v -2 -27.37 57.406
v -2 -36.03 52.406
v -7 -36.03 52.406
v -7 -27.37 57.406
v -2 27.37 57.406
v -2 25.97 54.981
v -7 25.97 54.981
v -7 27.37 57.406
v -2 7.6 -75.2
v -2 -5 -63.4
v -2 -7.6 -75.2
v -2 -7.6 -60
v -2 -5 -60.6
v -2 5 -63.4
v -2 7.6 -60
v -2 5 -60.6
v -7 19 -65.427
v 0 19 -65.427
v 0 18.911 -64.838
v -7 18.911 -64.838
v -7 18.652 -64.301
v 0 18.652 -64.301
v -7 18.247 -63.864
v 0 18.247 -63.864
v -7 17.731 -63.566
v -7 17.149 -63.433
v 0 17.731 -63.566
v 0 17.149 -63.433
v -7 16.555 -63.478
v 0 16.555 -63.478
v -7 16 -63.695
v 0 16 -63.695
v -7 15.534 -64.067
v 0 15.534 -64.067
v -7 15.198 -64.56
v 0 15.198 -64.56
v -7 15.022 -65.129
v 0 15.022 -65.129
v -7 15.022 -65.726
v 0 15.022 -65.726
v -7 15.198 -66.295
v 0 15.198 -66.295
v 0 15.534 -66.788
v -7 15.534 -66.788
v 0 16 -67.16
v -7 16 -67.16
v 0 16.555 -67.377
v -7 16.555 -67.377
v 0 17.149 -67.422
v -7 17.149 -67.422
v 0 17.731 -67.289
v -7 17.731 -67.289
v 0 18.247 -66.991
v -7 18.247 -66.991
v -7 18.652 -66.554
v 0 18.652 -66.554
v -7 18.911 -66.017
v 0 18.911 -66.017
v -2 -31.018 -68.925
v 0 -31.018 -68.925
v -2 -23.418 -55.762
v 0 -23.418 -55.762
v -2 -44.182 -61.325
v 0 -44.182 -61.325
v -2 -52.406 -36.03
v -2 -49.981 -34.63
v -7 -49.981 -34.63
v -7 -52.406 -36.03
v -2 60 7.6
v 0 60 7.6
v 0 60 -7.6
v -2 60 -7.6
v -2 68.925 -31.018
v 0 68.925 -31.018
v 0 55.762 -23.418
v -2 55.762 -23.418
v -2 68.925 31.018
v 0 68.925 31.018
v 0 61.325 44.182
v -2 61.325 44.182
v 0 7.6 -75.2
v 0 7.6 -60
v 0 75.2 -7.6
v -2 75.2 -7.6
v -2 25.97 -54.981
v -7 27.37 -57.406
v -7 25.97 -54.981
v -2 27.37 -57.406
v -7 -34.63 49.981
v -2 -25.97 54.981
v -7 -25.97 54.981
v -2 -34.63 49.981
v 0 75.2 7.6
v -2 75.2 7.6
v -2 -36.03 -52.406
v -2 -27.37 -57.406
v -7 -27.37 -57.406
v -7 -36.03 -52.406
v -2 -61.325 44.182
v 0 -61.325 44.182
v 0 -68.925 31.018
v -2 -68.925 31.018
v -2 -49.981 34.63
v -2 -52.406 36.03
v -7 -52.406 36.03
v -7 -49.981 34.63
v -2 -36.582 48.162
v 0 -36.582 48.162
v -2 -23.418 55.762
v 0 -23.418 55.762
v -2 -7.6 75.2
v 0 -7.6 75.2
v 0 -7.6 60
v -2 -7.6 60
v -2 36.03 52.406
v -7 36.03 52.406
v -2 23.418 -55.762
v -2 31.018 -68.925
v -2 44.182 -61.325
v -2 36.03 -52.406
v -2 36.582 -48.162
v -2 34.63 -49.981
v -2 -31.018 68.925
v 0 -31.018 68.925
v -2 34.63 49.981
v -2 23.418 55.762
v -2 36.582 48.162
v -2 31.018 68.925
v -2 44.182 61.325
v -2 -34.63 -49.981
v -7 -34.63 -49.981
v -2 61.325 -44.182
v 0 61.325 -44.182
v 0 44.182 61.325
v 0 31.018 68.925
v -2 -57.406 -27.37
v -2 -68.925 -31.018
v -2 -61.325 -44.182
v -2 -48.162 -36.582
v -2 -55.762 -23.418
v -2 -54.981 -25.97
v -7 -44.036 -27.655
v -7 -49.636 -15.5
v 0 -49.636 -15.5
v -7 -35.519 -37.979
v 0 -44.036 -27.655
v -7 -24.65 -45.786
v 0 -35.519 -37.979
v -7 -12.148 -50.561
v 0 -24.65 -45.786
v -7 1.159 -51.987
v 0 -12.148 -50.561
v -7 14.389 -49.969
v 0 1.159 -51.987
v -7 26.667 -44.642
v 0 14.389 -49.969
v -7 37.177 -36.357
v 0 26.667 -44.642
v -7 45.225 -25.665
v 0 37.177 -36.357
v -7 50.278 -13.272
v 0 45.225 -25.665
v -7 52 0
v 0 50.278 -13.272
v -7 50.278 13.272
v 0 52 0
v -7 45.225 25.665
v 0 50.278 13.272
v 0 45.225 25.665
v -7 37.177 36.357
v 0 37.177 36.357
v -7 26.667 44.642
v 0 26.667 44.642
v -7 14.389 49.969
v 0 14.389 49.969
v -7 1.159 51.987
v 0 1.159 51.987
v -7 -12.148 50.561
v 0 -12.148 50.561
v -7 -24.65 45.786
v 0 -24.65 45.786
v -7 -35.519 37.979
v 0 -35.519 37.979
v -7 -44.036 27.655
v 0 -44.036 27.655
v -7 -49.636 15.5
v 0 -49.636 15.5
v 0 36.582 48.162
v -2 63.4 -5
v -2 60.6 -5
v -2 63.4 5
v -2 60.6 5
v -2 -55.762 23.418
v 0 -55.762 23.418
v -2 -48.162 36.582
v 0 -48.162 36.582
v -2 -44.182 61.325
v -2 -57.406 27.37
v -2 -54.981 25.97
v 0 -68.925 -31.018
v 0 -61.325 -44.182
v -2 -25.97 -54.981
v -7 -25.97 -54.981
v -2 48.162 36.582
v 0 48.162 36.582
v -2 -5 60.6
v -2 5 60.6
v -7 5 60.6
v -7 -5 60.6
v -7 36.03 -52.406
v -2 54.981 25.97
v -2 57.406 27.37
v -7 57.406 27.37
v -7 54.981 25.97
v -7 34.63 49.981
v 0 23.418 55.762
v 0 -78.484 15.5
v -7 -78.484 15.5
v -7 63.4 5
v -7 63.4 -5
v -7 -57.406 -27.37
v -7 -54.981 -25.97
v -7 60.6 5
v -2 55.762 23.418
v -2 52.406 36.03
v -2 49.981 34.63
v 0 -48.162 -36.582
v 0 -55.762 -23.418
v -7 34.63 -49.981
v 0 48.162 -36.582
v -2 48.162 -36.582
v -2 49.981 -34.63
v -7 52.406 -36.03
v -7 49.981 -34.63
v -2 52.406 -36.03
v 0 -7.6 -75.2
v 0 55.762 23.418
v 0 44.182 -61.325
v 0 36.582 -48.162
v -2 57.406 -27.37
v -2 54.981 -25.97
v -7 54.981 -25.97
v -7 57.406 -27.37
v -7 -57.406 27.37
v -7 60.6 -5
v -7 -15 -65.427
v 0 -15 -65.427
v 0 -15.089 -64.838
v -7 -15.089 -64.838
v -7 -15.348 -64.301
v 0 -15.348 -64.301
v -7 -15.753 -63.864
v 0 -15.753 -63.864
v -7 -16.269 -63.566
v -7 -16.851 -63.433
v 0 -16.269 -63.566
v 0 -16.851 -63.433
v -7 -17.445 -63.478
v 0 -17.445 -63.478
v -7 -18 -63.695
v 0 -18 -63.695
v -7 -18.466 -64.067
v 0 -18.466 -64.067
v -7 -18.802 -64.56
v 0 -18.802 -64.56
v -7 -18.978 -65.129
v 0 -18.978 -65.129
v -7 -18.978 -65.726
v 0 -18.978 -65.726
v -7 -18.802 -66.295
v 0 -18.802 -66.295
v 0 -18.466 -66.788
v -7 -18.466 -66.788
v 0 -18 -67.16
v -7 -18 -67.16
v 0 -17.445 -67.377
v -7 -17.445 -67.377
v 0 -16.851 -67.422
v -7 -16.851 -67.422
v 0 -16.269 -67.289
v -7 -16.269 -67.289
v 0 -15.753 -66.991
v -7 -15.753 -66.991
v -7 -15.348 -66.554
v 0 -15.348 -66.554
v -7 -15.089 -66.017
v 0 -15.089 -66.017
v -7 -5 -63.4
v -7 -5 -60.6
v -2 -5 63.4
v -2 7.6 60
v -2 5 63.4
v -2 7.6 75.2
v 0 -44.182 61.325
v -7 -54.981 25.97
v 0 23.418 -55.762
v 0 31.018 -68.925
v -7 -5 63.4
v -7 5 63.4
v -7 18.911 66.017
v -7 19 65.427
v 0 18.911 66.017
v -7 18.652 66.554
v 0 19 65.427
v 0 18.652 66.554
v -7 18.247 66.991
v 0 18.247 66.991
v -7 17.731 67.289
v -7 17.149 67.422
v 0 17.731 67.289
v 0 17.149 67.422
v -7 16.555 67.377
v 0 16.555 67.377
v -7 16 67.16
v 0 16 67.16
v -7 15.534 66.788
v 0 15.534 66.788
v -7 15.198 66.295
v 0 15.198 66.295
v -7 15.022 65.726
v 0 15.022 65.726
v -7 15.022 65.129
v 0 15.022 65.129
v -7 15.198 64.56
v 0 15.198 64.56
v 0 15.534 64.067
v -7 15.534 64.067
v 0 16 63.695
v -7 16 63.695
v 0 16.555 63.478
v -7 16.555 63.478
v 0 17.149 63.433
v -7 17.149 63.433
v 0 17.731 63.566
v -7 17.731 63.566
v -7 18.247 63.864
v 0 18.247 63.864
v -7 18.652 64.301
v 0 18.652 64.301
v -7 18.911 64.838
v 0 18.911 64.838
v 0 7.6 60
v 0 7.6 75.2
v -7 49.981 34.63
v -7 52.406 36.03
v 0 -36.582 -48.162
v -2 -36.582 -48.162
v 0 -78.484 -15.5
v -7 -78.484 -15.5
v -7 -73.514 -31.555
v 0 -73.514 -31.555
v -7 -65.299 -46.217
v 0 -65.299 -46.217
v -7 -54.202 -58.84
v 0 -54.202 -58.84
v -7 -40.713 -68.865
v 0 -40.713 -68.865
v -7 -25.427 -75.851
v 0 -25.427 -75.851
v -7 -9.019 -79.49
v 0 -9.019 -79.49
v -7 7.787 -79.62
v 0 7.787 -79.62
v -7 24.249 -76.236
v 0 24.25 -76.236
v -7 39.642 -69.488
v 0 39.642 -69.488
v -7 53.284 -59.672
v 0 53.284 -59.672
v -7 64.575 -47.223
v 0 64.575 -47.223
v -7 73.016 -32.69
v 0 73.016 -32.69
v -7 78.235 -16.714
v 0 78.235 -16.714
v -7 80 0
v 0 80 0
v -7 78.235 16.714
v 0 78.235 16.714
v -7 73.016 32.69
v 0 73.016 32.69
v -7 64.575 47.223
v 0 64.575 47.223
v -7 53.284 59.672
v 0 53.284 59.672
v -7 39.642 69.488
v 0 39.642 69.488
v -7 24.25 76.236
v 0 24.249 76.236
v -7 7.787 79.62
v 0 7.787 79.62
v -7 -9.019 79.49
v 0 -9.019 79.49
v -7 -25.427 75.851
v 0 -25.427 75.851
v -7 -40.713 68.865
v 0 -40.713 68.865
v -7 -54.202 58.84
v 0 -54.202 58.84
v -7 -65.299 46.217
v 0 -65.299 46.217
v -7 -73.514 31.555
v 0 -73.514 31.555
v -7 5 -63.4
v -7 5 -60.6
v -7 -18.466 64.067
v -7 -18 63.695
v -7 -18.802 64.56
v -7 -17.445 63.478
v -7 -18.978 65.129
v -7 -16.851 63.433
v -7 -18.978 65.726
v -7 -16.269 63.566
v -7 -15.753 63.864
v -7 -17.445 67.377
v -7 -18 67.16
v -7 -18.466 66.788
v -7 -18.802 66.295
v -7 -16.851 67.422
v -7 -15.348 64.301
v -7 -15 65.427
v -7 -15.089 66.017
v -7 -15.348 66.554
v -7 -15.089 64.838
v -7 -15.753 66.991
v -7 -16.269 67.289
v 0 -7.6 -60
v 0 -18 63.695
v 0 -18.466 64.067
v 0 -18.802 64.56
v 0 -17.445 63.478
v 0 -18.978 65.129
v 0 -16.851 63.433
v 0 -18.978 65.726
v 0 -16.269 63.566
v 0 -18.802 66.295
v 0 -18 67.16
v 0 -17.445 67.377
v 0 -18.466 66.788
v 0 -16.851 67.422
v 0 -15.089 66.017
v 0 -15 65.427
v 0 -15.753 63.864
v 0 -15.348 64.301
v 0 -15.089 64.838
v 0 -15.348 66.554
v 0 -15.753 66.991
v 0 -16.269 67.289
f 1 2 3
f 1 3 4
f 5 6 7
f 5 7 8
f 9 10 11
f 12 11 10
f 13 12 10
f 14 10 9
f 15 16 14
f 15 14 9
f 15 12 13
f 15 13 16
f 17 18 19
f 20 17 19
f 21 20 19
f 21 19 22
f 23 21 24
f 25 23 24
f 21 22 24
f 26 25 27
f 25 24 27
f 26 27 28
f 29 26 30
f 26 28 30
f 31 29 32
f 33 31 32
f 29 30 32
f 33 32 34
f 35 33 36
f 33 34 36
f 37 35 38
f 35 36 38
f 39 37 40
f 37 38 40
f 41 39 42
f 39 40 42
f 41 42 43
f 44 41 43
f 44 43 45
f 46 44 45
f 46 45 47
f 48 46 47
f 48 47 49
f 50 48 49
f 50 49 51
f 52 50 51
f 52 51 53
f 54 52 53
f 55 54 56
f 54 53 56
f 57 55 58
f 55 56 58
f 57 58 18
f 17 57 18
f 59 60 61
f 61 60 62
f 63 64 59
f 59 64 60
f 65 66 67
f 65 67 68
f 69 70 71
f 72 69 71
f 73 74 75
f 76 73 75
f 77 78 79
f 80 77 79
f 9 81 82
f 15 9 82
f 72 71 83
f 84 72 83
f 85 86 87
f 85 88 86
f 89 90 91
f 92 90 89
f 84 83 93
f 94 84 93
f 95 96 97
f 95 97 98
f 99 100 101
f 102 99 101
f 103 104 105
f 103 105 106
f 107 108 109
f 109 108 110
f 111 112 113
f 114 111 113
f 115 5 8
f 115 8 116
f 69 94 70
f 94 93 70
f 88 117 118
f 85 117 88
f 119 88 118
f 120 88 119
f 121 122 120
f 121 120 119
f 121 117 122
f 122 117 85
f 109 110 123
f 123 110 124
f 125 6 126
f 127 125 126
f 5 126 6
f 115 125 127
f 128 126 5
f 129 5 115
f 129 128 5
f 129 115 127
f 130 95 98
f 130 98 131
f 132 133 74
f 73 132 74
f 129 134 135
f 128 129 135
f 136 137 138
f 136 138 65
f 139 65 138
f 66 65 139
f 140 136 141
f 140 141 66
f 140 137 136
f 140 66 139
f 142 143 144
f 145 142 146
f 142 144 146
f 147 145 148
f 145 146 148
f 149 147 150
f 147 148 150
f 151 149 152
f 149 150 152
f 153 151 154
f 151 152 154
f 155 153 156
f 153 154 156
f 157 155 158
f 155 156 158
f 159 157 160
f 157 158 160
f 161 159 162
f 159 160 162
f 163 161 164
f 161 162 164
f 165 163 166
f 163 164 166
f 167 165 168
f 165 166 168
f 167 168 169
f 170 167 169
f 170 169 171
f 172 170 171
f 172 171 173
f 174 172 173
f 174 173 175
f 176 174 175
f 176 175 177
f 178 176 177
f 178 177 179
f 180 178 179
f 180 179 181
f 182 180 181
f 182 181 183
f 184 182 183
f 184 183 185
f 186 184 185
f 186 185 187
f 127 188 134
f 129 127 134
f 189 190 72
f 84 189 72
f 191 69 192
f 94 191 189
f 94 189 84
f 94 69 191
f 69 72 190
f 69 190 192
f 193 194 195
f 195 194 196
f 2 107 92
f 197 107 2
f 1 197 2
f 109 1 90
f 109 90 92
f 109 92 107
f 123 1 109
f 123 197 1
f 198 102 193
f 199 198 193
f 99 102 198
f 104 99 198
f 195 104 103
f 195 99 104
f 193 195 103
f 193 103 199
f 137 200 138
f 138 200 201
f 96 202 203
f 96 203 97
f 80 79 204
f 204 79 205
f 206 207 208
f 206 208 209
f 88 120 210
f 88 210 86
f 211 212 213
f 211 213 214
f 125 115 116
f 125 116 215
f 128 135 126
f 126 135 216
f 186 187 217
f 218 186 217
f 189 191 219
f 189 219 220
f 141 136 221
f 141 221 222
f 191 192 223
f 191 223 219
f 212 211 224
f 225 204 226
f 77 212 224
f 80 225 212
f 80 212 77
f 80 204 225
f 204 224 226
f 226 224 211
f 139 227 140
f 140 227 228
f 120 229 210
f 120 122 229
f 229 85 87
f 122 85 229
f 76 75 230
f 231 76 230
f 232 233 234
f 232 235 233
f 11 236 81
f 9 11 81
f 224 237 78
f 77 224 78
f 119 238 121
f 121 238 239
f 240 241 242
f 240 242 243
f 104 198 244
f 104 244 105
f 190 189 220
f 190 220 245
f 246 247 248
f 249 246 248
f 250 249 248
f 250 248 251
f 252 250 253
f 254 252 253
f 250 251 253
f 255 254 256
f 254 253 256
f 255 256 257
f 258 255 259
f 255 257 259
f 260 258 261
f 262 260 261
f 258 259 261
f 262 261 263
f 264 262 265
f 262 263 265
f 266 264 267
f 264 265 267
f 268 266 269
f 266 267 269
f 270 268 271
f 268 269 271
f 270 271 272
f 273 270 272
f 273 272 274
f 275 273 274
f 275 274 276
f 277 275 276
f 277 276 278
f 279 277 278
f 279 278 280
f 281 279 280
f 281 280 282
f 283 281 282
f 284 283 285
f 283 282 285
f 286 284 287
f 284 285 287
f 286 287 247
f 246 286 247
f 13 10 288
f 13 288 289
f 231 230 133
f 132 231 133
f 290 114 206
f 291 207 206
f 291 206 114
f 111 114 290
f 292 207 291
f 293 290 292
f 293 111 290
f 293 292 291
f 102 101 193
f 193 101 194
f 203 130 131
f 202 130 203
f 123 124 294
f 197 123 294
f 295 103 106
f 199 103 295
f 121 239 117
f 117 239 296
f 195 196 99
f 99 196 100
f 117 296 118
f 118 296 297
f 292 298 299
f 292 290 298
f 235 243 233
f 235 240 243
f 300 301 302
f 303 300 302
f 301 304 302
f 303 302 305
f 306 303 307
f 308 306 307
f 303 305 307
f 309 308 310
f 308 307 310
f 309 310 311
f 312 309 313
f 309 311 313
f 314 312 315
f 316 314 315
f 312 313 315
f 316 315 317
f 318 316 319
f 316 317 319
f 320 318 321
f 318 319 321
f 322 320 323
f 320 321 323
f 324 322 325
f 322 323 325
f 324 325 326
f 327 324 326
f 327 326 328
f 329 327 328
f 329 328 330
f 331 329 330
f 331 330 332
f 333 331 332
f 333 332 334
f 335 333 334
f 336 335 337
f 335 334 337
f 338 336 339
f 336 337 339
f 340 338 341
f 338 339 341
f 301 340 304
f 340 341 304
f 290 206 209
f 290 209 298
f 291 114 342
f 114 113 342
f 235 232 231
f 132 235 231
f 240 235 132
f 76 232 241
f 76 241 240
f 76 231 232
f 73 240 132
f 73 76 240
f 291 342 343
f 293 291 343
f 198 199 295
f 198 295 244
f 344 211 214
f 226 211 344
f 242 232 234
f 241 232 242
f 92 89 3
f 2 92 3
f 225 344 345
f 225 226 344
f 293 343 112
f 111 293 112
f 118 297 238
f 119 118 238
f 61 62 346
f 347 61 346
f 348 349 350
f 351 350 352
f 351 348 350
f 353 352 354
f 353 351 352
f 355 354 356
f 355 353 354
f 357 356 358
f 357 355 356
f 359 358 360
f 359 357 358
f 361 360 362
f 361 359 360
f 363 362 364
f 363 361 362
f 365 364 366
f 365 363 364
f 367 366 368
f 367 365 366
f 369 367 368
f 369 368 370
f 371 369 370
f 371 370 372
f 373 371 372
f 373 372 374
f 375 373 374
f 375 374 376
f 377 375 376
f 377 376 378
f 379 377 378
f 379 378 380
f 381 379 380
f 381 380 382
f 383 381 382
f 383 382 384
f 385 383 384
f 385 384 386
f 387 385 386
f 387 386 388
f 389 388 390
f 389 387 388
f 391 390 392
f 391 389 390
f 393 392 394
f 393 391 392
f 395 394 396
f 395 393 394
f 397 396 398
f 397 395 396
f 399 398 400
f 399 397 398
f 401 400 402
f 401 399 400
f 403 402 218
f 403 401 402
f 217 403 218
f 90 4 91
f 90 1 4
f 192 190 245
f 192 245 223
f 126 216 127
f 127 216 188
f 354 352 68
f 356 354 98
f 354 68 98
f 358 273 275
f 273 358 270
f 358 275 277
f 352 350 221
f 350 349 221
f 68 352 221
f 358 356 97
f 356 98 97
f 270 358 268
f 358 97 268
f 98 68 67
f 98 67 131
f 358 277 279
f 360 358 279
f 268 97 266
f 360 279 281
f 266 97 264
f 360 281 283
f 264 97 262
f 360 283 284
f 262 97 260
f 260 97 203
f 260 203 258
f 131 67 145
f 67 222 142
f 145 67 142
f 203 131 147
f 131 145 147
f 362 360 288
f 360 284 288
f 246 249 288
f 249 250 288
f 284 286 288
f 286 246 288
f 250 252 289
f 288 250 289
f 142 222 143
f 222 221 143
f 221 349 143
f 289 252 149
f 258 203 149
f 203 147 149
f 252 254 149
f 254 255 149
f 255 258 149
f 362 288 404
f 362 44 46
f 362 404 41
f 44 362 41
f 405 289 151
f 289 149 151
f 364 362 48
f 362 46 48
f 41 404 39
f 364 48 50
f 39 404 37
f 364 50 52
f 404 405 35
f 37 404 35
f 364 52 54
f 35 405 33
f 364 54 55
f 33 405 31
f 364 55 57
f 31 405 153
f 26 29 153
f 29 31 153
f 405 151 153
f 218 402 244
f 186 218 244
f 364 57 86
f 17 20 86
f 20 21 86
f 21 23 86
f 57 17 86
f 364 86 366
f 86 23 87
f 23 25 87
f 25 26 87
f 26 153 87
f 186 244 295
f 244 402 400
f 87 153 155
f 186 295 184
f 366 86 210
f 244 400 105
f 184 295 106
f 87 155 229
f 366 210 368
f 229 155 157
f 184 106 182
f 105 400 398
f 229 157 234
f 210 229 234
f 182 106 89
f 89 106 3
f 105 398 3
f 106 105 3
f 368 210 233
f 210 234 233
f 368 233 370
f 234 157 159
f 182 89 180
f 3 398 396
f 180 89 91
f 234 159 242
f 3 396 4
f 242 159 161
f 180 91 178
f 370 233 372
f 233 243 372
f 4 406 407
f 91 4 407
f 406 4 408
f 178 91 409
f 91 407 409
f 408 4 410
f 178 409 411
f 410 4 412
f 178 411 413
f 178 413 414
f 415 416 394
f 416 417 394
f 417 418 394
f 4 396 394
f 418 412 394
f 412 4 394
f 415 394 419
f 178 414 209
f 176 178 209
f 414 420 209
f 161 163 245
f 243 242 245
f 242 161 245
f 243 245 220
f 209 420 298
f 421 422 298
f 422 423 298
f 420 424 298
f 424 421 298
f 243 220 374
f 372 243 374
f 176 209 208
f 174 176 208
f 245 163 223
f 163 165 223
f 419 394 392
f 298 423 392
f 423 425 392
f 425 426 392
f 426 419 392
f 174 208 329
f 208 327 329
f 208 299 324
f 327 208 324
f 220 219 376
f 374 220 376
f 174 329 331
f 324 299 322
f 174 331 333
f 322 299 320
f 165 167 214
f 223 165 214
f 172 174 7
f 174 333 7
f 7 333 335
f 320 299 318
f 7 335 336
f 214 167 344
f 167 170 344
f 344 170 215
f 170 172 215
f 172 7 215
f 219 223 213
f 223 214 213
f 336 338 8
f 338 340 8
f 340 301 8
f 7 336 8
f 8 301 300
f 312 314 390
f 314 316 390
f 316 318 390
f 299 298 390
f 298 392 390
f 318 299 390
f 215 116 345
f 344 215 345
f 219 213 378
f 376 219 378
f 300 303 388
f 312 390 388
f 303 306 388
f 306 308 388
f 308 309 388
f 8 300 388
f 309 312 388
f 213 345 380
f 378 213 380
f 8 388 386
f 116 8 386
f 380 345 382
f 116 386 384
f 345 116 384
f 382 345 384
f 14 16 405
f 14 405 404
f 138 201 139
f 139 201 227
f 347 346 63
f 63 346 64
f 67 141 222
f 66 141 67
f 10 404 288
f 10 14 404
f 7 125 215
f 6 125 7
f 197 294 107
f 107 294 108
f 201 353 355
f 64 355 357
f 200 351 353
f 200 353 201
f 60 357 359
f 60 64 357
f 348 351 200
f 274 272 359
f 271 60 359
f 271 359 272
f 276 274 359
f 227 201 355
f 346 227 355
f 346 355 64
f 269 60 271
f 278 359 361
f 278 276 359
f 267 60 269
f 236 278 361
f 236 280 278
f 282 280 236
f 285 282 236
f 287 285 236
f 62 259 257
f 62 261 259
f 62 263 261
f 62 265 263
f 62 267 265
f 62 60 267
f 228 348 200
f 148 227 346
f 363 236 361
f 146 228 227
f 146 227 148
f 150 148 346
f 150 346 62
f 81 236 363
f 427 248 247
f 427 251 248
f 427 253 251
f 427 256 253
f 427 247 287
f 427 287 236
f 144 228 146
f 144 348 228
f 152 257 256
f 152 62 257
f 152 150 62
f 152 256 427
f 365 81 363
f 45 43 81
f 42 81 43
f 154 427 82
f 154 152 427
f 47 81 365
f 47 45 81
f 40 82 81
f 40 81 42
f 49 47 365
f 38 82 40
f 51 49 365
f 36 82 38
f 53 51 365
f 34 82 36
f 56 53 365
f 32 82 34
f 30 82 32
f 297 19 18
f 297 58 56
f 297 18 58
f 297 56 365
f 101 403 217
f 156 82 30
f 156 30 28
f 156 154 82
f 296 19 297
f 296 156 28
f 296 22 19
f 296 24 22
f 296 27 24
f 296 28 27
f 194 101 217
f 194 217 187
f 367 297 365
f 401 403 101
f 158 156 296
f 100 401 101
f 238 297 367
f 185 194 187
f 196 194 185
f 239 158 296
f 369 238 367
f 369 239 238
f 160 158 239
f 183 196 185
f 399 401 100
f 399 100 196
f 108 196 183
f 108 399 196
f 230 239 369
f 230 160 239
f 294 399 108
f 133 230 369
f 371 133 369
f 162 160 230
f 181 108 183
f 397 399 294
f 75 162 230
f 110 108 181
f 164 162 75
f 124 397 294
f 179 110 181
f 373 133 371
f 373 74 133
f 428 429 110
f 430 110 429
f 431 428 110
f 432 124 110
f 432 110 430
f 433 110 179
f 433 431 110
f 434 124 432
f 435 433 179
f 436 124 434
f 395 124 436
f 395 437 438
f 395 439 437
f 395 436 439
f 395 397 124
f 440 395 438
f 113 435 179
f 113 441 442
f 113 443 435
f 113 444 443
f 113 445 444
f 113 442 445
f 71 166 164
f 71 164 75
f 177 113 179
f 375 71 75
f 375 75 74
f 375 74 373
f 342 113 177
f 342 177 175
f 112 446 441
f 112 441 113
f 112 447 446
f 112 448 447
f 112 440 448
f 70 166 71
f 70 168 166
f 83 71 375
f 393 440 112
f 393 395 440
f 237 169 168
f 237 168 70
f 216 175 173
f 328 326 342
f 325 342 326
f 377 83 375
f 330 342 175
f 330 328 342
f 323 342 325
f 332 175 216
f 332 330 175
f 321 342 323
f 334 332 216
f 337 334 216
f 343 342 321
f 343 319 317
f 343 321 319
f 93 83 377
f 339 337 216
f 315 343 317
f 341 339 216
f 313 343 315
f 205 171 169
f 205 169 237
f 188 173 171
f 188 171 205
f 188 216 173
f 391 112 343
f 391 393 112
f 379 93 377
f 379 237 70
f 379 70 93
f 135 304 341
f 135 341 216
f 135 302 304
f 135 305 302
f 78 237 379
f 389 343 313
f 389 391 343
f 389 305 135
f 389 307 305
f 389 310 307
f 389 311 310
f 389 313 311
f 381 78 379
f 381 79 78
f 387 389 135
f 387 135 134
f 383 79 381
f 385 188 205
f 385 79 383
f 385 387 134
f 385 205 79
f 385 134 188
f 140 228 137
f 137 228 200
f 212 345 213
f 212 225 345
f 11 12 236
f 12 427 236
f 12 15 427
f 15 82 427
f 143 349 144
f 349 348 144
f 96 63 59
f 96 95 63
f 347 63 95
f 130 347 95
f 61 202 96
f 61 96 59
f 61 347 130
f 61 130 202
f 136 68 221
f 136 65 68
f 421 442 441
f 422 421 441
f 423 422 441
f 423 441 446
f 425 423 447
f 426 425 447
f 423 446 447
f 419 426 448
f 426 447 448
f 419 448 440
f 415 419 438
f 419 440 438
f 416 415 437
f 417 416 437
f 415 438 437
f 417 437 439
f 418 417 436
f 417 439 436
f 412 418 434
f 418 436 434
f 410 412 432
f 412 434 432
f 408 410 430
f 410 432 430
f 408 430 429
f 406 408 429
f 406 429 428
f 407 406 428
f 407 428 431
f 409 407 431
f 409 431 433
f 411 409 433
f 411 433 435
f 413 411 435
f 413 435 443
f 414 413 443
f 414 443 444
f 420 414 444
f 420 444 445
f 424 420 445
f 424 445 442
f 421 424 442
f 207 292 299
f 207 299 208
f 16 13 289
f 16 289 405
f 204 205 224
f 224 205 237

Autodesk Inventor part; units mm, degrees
ref_plane "YZ Plane" through (0, 0, 0) normal (1, 0, 0) x (0, 1, 0)
ref_plane "XZ Plane" through (0, 0, 0) normal (0, 1, 0) x (-1, 0, 0)
ref_plane "XY Plane" through (0, 0, 0) normal (0, 0, 1) x (1, 0, 0)
sketch "Szkic1" plane through (0, 0, 0) normal (1, 0, 0) x (0, 1, 0)
  line L0 (0, -112) -> (0, 112) construction
  line L1 (-112, 0) -> (112, 0) construction
  circle A0 centre (0, 0) radius 67.6 construction
  line L2 (75.2, 7.6) -> (60, 7.6)
  line L3 (60, 7.6) -> (60, -7.6)
  line L4 (60, -7.6) -> (75.2, -7.6)
  line L5 (75.2, -7.6) -> (75.2, 7.6)
  line L6 (75.2, 7.6) -> (60, -7.6) construction
  line L7 (60, 7.6) -> (75.2, -7.6) construction
  circle A1 centre (0, 0) radius 80
  line L8 (61.3251, 44.1818) -> (48.1615, 36.5818)
  line L9 (48.1615, 36.5818) -> (55.7615, 23.4182)
  line L10 (55.7615, 23.4182) -> (68.9251, 31.0182)
  line L11 (68.9251, 31.0182) -> (61.3251, 44.1818)
  line L12 (61.3251, 44.1818) -> (55.7615, 23.4182) construction
  line L13 (48.1615, 36.5818) -> (68.9251, 31.0182) construction
  line L14 (31.0182, 68.9251) -> (23.4182, 55.7615)
  line L15 (23.4182, 55.7615) -> (36.5818, 48.1615)
  line L16 (36.5818, 48.1615) -> (44.1818, 61.3251)
  line L17 (44.1818, 61.3251) -> (31.0182, 68.9251)
  line L18 (31.0182, 68.9251) -> (36.5818, 48.1615) construction
  line L19 (23.4182, 55.7615) -> (44.1818, 61.3251) construction
  line L20 (-7.6, 75.2) -> (-7.6, 60)
  line L21 (-7.6, 60) -> (7.6, 60)
  line L22 (7.6, 60) -> (7.6, 75.2)
  line L23 (7.6, 75.2) -> (-7.6, 75.2)
  line L24 (-7.6, 75.2) -> (7.6, 60) construction
  line L25 (-7.6, 60) -> (7.6, 75.2) construction
  line L26 (-44.1818, 61.3251) -> (-36.5818, 48.1615)
  line L27 (-36.5818, 48.1615) -> (-23.4182, 55.7615)
  line L28 (-23.4182, 55.7615) -> (-31.0182, 68.9251)
  line L29 (-31.0182, 68.9251) -> (-44.1818, 61.3251)
  line L30 (-44.1818, 61.3251) -> (-23.4182, 55.7615) construction
  line L31 (-36.5818, 48.1615) -> (-31.0182, 68.9251) construction
  line L32 (-68.9251, 31.0182) -> (-55.7615, 23.4182)
  line L33 (-55.7615, 23.4182) -> (-48.1615, 36.5818)
  line L34 (-48.1615, 36.5818) -> (-61.3251, 44.1818)
  line L35 (-61.3251, 44.1818) -> (-68.9251, 31.0182)
  line L36 (-68.9251, 31.0182) -> (-48.1615, 36.5818) construction
  line L37 (-55.7615, 23.4182) -> (-61.3251, 44.1818) construction
  line L38 (-75.2, -7.6) -> (-60, -7.6) construction
  line L39 (-60, -7.6) -> (-60, 7.6) construction
  line L40 (-60, 7.6) -> (-75.2, 7.6) construction
  line L41 (-75.2, 7.6) -> (-75.2, -7.6) construction
  line L42 (-75.2, -7.6) -> (-60, 7.6) construction
  line L43 (-60, -7.6) -> (-75.2, 7.6) construction
  line L44 (-61.3251, -44.1818) -> (-48.1615, -36.5818)
  line L45 (-48.1615, -36.5818) -> (-55.7615, -23.4182)
  line L46 (-55.7615, -23.4182) -> (-68.9251, -31.0182)
  line L47 (-68.9251, -31.0182) -> (-61.3251, -44.1818)
  line L48 (-61.3251, -44.1818) -> (-55.7615, -23.4182) construction
  line L49 (-48.1615, -36.5818) -> (-68.9251, -31.0182) construction
  line L50 (-31.0182, -68.9251) -> (-23.4182, -55.7615)
  line L51 (-23.4182, -55.7615) -> (-36.5818, -48.1615)
  line L52 (-36.5818, -48.1615) -> (-44.1818, -61.3251)
  line L53 (-44.1818, -61.3251) -> (-31.0182, -68.9251)
  line L54 (-31.0182, -68.9251) -> (-36.5818, -48.1615) construction
  line L55 (-23.4182, -55.7615) -> (-44.1818, -61.3251) construction
  line L56 (7.6, -75.2) -> (7.6, -60)
  line L57 (7.6, -60) -> (-7.6, -60)
  line L58 (-7.6, -60) -> (-7.6, -75.2)
  line L59 (-7.6, -75.2) -> (7.6, -75.2)
  line L60 (7.6, -75.2) -> (-7.6, -60) construction
  line L61 (7.6, -60) -> (-7.6, -75.2) construction
  line L62 (44.1818, -61.3251) -> (36.5818, -48.1615)
  line L63 (36.5818, -48.1615) -> (23.4182, -55.7615)
  line L64 (23.4182, -55.7615) -> (31.0182, -68.9251)
  line L65 (31.0182, -68.9251) -> (44.1818, -61.3251)
  line L66 (44.1818, -61.3251) -> (23.4182, -55.7615) construction
  line L67 (36.5818, -48.1615) -> (31.0182, -68.9251) construction
  line L68 (68.9251, -31.0182) -> (55.7615, -23.4182)
  line L69 (55.7615, -23.4182) -> (48.1615, -36.5818)
  line L70 (48.1615, -36.5818) -> (61.3251, -44.1818)
  line L71 (61.3251, -44.1818) -> (68.9251, -31.0182)
  line L72 (68.9251, -31.0182) -> (48.1615, -36.5818) construction
  line L73 (55.7615, -23.4182) -> (61.3251, -44.1818) construction
  line L74 (0, 15.5) -> (-80, 15.5)
  line L75 (-80, 15.5) -> (-80, -15.5) construction
  line L76 (-80, -15.5) -> (0, -15.5)
  line L77 (0, -15.5) -> (0, 15.5)
  line L78 (0, 15.5) -> (-80, -15.5) construction
  line L79 (-80, 15.5) -> (0, -15.5) construction
  circle A2 centre (0, 0) radius 52
  line L80 (63.4, -5) -> (60.6, -5)
  line L81 (60.6, -5) -> (60.6, 5)
  line L82 (60.6, 5) -> (63.4, 5)
  line L83 (63.4, 5) -> (63.4, -5)
  line L84 (63.4, -5) -> (60.6, 5) construction
  line L85 (60.6, -5) -> (63.4, 5) construction
  line L86 (54.9811, 25.9699) -> (49.9811, 34.6301)
  line L87 (49.9811, 34.6301) -> (52.406, 36.0301)
  line L88 (52.406, 36.0301) -> (57.406, 27.3699)
  line L89 (57.406, 27.3699) -> (49.9811, 34.6301) construction
  line L90 (54.9811, 25.9699) -> (52.406, 36.0301) construction
  line L91 (57.406, 27.3699) -> (54.9811, 25.9699)
  line L92 (34.6301, 49.9811) -> (25.9699, 54.9811)
  line L93 (25.9699, 54.9811) -> (27.3699, 57.406)
  line L94 (27.3699, 57.406) -> (36.0301, 52.406)
  line L95 (36.0301, 52.406) -> (25.9699, 54.9811) construction
  line L96 (34.6301, 49.9811) -> (27.3699, 57.406) construction
  line L97 (36.0301, 52.406) -> (34.6301, 49.9811)
  line L98 (5, 60.6) -> (-5, 60.6)
  line L99 (-5, 60.6) -> (-5, 63.4)
  line L100 (-5, 63.4) -> (5, 63.4)
  line L101 (5, 63.4) -> (-5, 60.6) construction
  line L102 (5, 60.6) -> (-5, 63.4) construction
  line L103 (5, 63.4) -> (5, 60.6)
  line L104 (-25.9699, 54.9811) -> (-34.6301, 49.9811)
  line L105 (-34.6301, 49.9811) -> (-36.0301, 52.406)
  line L106 (-36.0301, 52.406) -> (-27.3699, 57.406)
  line L107 (-27.3699, 57.406) -> (-34.6301, 49.9811) construction
  line L108 (-25.9699, 54.9811) -> (-36.0301, 52.406) construction
  line L109 (-27.3699, 57.406) -> (-25.9699, 54.9811)
  line L110 (-49.9811, 34.6301) -> (-54.9811, 25.9699)
  line L111 (-54.9811, 25.9699) -> (-57.406, 27.3699)
  line L112 (-57.406, 27.3699) -> (-52.406, 36.0301)
  line L113 (-52.406, 36.0301) -> (-54.9811, 25.9699) construction
  line L114 (-49.9811, 34.6301) -> (-57.406, 27.3699) construction
  line L115 (-52.406, 36.0301) -> (-49.9811, 34.6301)
  line L116 (-60.6, 5) -> (-60.6, -5) construction
  line L117 (-60.6, -5) -> (-63.4, -5) construction
  line L118 (-63.4, -5) -> (-63.4, 5) construction
  line L119 (-63.4, 5) -> (-60.6, -5) construction
  line L120 (-60.6, 5) -> (-63.4, -5) construction
  line L121 (-63.4, 5) -> (-60.6, 5) construction
  line L122 (-54.9811, -25.9699) -> (-49.9811, -34.6301)
  line L123 (-49.9811, -34.6301) -> (-52.406, -36.0301)
  line L124 (-52.406, -36.0301) -> (-57.406, -27.3699)
  line L125 (-57.406, -27.3699) -> (-49.9811, -34.6301) construction
  line L126 (-54.9811, -25.9699) -> (-52.406, -36.0301) construction
  line L127 (-57.406, -27.3699) -> (-54.9811, -25.9699)
  line L128 (-34.6301, -49.9811) -> (-25.9699, -54.9811)
  line L129 (-25.9699, -54.9811) -> (-27.3699, -57.406)
  line L130 (-27.3699, -57.406) -> (-36.0301, -52.406)
  line L131 (-36.0301, -52.406) -> (-25.9699, -54.9811) construction
  line L132 (-34.6301, -49.9811) -> (-27.3699, -57.406) construction
  line L133 (-36.0301, -52.406) -> (-34.6301, -49.9811)
  line L134 (-5, -60.6) -> (5, -60.6)
  line L135 (5, -60.6) -> (5, -63.4)
  line L136 (5, -63.4) -> (-5, -63.4)
  line L137 (-5, -63.4) -> (5, -60.6) construction
  line L138 (-5, -60.6) -> (5, -63.4) construction
  line L139 (-5, -63.4) -> (-5, -60.6)
  line L140 (25.9699, -54.9811) -> (34.6301, -49.9811)
  line L141 (34.6301, -49.9811) -> (36.0301, -52.406)
  line L142 (36.0301, -52.406) -> (27.3699, -57.406)
  line L143 (27.3699, -57.406) -> (34.6301, -49.9811) construction
  line L144 (25.9699, -54.9811) -> (36.0301, -52.406) construction
  line L145 (27.3699, -57.406) -> (25.9699, -54.9811)
  line L146 (49.9811, -34.6301) -> (54.9811, -25.9699)
  line L147 (54.9811, -25.9699) -> (57.406, -27.3699)
  line L148 (57.406, -27.3699) -> (52.406, -36.0301)
  line L149 (52.406, -36.0301) -> (54.9811, -25.9699) construction
  line L150 (49.9811, -34.6301) -> (57.406, -27.3699) construction
  line L151 (52.406, -36.0301) -> (49.9811, -34.6301)
  circle A3 centre (-17, 65.4275) radius 2
  circle A4 centre (17, 65.4275) radius 2
  circle A5 centre (-17, -65.4275) radius 2
  circle A6 centre (17, -65.4275) radius 2
  point P0 (67.6, 0)
  point P1 (58.5433, 33.8)
  point P2 (33.8, 58.5433)
  point P3 (0, 67.6)
  point P4 (-33.8, 58.5433)
  point P5 (-58.5433, 33.8)
  point P6 (-67.6, 0)
  point P7 (-58.5433, -33.8)
  point P8 (-33.8, -58.5433)
  point P9 (0, -67.6)
  point P10 (33.8, -58.5433)
  point P11 (58.5433, -33.8)
  point P12 (-40, 0)
  point P13 (-49.6362, 15.5)
  point P14 (-49.6362, -15.5)
  point P15 (-78.4841, -15.5)
  point P16 (-78.4841, 15.5)
  point P17 (62, 0)
  point P18 (0, 0)
  point P19 (53.6936, 31)
  point P20 (31, 53.6936)
  point P21 (0, 62)
  point P22 (-31, 53.6936)
  point P23 (-53.6936, 31)
  point P24 (-62, 0)
  point P25 (-53.6936, -31)
  point P26 (-31, -53.6936)
  point P27 (0, -62)
  point P28 (31, -53.6936)
  point P29 (53.6936, -31)
  dimension "d1" = 15.2
  dimension "d2" = 15.2
  dimension "d3" = 160
  dimension "d6" = 360
  dimension "d8" = 60
  dimension "d13" = 31
  dimension "d14" = 104
  dimension "d15" = 2.8
  dimension "d16" = 10
  dimension "d17" = 62
  dimension "d20" = 360
  dimension "d22" = 4
  dimension "d23" = 17
extrude "Wyciągnięcie proste1" add sketch "Szkic1" against normal blind 7 contours L5 L4 L3 L2 | A1 L76 A2 L74 | L11 L10 L9 L8 | L17 L16 L15 L14 | L23 L22 L21 L20 | L29 L28 L27 L26 | L35 L34 L33 L32 | L47 L46 L45 L44 | L53 L52 L51 L50 | L59 L58 L57 L56 | L65 L64 L63 L62 | L71 L70 L69 L68 picked at (47.2911, 46.9149)
extrude "Wyciągnięcie proste2" cut sketch "Szkic1" against normal blind 2 contours L5 L4 L3 L2 | L11 L10 L9 L8 | L17 L16 L15 L14 | L23 L22 L21 L20 | L29 L28 L27 L26 | L35 L34 L33 L32 | L47 L46 L45 L44 | L53 L52 L51 L50 | L59 L58 L57 L56 | L65 L64 L63 L62 | L71 L70 L69 L68 | L80 L81 L82 L83 | L86 L87 L88 L91 | L92 L93 L94 L97 | L98 L99 L100 L103 | L104 L105 L106 L109 | L110 L111 L112 L115 | L122 L123 L124 L127 | L128 L129 L130 L133 | L134 L135 L136 L139 | L140 L141 L142 L145 | L146 L147 L148 L151
properties part number "uMule-podstawka_czujnikiIR"
